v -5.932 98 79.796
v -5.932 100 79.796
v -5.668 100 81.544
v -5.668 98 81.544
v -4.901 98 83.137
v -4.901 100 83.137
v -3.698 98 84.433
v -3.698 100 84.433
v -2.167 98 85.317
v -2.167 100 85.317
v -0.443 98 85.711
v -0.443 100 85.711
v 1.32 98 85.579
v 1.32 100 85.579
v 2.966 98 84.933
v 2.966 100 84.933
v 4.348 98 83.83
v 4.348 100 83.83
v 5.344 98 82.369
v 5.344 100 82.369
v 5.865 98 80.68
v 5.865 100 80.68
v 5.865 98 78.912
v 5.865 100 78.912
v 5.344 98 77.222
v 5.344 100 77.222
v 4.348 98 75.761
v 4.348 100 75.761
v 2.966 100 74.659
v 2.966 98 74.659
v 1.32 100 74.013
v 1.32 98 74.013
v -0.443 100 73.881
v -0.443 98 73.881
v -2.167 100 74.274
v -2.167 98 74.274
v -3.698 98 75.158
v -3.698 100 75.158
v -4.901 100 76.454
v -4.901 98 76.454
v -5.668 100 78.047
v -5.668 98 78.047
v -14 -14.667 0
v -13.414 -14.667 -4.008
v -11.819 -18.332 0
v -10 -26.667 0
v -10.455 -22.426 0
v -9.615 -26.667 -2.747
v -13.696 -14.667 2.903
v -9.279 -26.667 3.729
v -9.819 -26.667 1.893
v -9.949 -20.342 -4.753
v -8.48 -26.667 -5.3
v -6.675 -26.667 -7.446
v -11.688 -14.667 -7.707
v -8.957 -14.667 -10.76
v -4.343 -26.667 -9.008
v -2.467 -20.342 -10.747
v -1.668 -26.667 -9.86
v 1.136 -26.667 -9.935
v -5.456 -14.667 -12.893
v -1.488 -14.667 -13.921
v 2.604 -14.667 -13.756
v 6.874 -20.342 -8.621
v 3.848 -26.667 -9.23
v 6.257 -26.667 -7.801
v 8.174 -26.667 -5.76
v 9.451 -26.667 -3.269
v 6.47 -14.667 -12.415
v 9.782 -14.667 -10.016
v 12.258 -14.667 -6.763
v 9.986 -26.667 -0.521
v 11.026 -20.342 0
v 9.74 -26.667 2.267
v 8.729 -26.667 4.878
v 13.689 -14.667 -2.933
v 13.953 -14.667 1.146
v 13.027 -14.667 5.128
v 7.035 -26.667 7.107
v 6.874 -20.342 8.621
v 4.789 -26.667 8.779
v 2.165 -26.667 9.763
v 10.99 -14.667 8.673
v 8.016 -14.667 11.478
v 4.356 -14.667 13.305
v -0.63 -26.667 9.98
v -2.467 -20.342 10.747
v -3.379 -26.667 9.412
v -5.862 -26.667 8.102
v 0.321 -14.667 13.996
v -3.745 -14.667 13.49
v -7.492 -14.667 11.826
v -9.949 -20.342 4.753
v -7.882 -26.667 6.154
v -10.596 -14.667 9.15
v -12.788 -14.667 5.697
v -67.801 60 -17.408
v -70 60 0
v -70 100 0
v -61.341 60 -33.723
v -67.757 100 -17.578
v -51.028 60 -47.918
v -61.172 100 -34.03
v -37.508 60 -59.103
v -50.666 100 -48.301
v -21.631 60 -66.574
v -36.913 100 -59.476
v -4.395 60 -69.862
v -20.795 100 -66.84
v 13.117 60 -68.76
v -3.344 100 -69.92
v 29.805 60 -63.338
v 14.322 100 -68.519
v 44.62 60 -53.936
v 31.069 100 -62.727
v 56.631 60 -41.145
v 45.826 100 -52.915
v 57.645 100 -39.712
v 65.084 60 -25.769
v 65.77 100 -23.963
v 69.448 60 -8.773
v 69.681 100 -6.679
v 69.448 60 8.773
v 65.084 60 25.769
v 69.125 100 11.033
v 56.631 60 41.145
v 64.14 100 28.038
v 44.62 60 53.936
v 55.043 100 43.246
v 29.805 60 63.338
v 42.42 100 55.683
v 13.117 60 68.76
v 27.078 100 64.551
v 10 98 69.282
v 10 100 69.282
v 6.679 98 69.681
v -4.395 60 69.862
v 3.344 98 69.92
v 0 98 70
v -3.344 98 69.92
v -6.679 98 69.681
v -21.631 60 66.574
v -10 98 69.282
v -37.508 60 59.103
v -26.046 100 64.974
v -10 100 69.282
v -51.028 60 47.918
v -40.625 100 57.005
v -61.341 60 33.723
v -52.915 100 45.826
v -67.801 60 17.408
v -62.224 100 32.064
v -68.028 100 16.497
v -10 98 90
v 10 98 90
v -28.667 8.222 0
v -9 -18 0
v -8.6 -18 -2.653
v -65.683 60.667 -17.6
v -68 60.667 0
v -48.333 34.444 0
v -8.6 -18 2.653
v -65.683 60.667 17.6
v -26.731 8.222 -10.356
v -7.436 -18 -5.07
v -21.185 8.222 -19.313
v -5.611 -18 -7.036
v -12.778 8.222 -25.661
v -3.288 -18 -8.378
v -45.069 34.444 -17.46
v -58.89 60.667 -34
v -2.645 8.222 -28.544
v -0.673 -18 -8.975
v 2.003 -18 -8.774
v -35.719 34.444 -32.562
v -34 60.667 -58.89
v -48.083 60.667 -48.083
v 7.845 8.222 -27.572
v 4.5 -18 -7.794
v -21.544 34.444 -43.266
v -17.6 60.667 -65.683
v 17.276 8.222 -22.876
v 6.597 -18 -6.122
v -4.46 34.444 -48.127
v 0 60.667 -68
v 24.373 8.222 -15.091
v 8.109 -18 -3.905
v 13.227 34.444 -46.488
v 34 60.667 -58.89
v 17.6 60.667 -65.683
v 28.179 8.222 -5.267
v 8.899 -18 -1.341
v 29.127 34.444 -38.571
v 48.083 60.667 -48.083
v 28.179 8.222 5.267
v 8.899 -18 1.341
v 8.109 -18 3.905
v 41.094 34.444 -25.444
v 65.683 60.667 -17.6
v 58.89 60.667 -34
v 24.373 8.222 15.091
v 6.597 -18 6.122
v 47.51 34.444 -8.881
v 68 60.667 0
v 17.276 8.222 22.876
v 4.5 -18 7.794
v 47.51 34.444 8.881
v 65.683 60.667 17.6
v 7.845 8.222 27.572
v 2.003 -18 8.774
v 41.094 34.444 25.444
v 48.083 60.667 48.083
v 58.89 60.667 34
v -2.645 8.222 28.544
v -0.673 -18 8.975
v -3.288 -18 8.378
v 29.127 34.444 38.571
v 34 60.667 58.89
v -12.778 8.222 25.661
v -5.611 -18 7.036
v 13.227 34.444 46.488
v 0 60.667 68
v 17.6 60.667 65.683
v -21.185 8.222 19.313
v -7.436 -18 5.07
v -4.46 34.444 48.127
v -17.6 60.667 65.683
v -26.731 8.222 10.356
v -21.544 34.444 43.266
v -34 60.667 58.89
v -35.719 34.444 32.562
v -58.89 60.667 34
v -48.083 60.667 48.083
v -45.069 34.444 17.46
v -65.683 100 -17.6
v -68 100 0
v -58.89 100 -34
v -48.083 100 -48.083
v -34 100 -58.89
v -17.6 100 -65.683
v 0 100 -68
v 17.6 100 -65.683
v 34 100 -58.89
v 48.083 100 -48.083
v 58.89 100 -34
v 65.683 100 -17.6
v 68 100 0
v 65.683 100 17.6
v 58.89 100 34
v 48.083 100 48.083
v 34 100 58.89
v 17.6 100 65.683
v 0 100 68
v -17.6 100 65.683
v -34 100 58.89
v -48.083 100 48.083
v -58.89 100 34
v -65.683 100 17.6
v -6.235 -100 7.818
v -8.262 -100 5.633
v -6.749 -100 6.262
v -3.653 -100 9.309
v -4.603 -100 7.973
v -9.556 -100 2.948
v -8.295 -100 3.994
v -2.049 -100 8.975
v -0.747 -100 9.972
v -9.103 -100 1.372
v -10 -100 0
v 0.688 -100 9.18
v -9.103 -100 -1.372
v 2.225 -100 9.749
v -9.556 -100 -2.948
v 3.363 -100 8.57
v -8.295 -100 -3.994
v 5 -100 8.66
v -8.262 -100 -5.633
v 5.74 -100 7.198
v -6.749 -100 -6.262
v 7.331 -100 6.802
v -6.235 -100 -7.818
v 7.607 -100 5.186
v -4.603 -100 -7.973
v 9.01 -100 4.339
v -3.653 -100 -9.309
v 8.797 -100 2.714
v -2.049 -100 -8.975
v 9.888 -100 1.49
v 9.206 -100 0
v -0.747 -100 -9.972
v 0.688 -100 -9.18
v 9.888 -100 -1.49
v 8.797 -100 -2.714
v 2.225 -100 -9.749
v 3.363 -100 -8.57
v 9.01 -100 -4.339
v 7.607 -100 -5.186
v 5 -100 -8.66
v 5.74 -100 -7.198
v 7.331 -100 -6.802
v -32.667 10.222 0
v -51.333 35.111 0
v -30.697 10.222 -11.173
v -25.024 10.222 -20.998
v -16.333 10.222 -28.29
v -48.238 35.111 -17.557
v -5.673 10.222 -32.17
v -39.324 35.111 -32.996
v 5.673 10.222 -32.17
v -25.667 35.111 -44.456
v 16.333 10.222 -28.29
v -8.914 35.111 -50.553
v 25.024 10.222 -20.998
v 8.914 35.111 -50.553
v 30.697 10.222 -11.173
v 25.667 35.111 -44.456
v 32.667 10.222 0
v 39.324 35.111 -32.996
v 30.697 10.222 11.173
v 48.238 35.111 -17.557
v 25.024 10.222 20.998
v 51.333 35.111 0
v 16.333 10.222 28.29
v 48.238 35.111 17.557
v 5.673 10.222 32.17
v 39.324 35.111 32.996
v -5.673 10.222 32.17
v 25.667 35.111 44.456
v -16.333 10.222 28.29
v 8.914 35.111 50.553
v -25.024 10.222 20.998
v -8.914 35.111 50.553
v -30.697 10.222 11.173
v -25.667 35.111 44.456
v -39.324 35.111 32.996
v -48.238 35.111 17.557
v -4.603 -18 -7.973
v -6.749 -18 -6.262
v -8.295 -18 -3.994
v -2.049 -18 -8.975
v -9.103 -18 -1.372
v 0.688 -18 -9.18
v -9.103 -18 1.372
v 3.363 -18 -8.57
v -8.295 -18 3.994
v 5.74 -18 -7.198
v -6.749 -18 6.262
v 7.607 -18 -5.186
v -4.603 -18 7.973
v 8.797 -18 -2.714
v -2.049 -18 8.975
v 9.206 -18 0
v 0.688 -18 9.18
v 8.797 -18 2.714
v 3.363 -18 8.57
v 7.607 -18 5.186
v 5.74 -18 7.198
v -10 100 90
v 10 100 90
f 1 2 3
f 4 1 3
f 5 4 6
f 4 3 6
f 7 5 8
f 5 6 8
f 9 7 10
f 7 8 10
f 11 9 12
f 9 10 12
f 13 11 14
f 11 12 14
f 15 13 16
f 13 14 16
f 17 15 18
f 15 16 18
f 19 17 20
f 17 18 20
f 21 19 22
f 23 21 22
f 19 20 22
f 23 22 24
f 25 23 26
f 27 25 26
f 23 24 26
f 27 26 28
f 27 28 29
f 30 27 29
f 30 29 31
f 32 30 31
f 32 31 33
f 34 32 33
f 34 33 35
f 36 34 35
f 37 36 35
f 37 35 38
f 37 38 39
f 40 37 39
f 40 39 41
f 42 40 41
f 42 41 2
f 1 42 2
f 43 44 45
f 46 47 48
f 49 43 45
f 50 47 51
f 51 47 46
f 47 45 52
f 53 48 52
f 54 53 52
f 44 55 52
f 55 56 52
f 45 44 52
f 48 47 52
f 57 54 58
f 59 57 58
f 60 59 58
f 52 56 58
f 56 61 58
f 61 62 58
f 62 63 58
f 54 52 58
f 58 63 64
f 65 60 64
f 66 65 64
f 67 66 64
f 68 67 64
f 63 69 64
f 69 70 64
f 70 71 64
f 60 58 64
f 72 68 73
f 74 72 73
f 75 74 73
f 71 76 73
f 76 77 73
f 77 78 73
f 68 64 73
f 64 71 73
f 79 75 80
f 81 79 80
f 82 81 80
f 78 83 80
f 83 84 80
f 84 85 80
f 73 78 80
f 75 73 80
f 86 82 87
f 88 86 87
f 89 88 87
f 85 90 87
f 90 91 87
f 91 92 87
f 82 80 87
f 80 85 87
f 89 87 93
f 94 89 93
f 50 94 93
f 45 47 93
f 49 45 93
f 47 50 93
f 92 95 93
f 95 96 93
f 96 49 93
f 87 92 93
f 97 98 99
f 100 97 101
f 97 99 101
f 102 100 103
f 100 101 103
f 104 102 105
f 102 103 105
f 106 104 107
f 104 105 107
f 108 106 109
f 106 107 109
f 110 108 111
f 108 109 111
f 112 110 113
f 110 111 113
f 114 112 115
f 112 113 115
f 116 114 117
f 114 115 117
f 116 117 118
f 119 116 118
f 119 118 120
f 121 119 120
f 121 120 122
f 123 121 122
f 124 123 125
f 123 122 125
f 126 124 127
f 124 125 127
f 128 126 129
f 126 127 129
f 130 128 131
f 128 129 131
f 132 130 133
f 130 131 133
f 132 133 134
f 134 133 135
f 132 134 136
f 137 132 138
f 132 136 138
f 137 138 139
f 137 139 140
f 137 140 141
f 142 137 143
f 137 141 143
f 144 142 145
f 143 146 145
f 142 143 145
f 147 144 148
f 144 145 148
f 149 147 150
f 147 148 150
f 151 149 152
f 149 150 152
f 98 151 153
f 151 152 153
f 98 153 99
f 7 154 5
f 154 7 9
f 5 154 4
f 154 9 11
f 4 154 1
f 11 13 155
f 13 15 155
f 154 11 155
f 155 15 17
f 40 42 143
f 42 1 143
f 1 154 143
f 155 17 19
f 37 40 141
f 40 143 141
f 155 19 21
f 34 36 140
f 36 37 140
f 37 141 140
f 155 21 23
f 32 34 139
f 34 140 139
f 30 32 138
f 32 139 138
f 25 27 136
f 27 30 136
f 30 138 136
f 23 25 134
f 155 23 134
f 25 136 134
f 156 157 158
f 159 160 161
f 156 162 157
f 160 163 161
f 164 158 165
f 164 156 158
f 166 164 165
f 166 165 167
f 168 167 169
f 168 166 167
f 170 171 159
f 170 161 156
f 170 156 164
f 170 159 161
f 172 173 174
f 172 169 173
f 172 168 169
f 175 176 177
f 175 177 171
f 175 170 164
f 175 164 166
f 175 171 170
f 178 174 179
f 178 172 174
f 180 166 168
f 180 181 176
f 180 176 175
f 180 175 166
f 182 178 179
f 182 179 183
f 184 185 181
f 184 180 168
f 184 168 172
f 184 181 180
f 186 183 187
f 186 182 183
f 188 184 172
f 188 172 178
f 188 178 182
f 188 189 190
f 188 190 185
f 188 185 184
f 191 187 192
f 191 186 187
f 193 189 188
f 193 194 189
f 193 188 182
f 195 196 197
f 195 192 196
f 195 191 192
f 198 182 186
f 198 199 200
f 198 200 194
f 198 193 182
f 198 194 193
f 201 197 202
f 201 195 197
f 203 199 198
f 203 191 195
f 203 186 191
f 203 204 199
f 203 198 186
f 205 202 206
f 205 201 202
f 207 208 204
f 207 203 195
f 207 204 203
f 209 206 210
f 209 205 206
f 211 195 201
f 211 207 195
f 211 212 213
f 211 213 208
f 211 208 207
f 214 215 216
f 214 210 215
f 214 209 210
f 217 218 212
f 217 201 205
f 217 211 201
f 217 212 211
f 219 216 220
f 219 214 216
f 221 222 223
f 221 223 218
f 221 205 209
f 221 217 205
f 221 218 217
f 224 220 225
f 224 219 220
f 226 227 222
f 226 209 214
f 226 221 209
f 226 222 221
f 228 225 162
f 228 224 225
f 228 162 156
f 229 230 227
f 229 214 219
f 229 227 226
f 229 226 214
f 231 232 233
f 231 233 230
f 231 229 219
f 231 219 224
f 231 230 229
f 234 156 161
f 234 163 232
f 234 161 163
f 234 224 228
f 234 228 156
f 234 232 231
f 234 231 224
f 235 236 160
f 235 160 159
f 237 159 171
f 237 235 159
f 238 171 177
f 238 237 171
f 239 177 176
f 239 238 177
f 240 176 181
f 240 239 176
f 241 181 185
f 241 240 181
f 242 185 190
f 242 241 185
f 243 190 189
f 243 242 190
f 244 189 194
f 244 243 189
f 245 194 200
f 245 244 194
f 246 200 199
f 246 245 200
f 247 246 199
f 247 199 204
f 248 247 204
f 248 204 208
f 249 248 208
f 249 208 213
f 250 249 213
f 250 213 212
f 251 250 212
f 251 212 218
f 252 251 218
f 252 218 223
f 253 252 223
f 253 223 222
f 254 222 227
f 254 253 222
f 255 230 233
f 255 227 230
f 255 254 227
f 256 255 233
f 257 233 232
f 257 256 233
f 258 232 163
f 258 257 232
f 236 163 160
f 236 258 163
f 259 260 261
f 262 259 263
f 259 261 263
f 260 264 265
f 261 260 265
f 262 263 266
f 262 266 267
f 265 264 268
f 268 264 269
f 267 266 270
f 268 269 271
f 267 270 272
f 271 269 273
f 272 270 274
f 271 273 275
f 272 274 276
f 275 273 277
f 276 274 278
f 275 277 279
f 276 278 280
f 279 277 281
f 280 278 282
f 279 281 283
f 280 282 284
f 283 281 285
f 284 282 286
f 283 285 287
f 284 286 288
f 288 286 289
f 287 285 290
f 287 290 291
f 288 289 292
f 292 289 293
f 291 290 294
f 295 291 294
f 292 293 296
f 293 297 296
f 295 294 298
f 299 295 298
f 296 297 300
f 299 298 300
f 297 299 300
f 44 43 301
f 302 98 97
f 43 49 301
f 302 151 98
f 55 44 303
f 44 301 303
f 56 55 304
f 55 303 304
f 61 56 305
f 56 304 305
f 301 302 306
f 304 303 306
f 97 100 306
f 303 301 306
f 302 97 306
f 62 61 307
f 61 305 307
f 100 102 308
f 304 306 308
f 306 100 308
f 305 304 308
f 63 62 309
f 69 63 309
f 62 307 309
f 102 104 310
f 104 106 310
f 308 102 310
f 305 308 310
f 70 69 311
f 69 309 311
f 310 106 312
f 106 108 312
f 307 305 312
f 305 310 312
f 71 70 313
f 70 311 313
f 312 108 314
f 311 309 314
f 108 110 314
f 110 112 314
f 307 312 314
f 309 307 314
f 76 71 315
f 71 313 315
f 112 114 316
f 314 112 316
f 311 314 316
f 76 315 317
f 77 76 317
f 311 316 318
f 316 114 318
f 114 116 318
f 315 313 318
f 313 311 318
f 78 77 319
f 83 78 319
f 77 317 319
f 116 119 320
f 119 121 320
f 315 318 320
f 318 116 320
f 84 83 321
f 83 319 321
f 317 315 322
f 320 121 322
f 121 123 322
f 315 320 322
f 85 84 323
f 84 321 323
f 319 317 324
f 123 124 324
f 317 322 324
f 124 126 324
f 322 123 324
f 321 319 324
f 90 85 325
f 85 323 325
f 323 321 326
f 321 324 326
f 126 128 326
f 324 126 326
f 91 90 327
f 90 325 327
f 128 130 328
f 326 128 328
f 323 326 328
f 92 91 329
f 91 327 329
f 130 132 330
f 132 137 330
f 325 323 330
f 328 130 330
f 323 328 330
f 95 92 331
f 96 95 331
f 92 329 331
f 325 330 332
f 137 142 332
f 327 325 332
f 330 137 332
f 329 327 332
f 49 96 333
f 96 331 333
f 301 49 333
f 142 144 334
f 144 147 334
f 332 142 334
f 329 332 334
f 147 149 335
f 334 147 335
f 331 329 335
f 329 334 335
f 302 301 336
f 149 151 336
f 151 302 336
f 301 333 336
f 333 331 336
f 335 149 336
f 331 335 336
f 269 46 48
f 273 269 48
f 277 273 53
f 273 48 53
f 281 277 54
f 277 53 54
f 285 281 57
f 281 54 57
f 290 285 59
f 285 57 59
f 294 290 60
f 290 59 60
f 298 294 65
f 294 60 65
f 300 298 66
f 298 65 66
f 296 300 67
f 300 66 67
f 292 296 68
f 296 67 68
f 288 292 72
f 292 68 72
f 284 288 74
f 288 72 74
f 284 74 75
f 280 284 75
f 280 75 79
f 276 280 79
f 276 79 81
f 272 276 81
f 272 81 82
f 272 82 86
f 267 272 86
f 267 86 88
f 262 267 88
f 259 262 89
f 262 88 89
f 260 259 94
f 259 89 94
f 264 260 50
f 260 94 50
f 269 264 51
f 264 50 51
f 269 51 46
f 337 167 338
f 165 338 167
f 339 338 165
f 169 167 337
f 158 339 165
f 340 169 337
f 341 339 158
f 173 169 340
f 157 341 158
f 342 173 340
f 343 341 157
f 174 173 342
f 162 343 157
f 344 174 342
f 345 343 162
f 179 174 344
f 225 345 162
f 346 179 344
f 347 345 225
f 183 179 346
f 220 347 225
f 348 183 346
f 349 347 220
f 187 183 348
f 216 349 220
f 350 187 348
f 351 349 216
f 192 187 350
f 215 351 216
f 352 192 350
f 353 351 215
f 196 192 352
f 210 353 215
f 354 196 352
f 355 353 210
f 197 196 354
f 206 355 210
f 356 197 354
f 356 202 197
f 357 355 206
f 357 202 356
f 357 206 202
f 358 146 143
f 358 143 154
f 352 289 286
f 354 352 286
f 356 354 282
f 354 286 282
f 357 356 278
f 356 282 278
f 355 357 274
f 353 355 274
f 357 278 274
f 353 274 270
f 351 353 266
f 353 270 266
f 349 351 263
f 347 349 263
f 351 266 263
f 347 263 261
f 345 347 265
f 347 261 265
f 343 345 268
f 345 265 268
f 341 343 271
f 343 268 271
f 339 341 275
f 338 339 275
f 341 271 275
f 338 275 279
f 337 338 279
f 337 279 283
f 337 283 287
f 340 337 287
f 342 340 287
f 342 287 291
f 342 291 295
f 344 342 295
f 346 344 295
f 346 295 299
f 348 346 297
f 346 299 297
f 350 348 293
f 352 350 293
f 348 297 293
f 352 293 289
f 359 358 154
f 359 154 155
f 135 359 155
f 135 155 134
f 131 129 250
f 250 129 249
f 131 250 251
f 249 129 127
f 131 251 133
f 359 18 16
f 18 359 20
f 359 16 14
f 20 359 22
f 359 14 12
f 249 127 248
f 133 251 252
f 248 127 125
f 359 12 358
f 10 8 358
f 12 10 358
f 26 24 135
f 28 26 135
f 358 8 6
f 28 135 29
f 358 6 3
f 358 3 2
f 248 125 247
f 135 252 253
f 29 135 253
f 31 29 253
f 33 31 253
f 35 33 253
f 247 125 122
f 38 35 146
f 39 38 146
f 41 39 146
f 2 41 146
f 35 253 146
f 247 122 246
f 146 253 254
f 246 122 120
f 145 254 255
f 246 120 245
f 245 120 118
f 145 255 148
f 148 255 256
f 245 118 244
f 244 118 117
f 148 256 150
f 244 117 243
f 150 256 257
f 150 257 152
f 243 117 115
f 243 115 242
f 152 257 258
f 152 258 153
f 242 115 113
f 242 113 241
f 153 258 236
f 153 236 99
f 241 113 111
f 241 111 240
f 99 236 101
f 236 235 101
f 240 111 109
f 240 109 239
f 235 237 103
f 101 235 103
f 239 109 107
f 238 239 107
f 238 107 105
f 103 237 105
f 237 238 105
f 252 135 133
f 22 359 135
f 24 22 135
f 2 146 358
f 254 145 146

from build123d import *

# Parameters (mm, degrees)
VACIADO1_T              = -2
SALIENTE_EXTRUIR1_DEPTH = 2
CROQUIS3_R              = 5.931653108
CORTAR_EXTRUIR1_DEPTH   = 22
CROQUIS4_R              = 9.206232533
CORTAR_EXTRUIR2_DEPTH   = 82
REDONDEO1_R             = 20


with BuildPart() as part:
    # Croquis1 → Revolución1 (revolve)
    with BuildSketch(Plane.XY, mode=Mode.PRIVATE) as revoluci_n1_sk:
        Polygon((10, -20), (70, 60), (70, 100), (0, 100), (0, -100), (10, -100), align=None)
    revolve(revoluci_n1_sk.sketch.rotate(Axis((0, 100, 0), (0, -1, 0)), 180), axis=Axis((0, 100, 0), (0, -1, 0)))

    # Vaciado1
    vaciado1_openings = [part.faces().sort_by_distance(p)[0] for p in [
        (0, -100, 0),
        (0, 100, 0),
    ]]
    offset(amount=VACIADO1_T, openings=vaciado1_openings, kind=Kind.INTERSECTION)

    # Croquis2 → Saliente-Extruir1 (add)
    with BuildSketch(Plane(origin=(0, 100, 0), x_dir=(1, 0, 0), z_dir=(0, 1, 0))):
        with BuildLine():
            ThreePointArc((10, -69.282032303), (5.012870376, -69.82027736), (0, -70))
            Line((0, -70), (0, -90))
            Line((0, -90), (10, -90))
            Line((10, -90), (10, -69.282032303))
        make_face()
        with BuildLine():
            Line((0, -90), (0, -70))
            ThreePointArc((0, -70), (-5.012870376, -69.82027736), (-10, -69.282032303))
            Line((-10, -69.282032303), (-10, -90))
            Line((-10, -90), (0, -90))
        make_face()
    extrude(amount=-SALIENTE_EXTRUIR1_DEPTH)

    # Croquis3 → Cortar-Extruir1 (cut)
    with BuildSketch(Plane(origin=(0, 100, 0), x_dir=(1, 0, 0), z_dir=(0, 1, 0))):
        with Locations(Location((0, -79.795784901, 0), (0, 0, 180))):
            Circle(CROQUIS3_R)
    extrude(amount=-CORTAR_EXTRUIR1_DEPTH, mode=Mode.SUBTRACT)

    # Croquis4 → Cortar-Extruir2 (cut)
    with BuildSketch(Plane(origin=(0, -100, 0), x_dir=(-1, 0, 0), z_dir=(0, -1, 0))):
        with Locations(Location((0, 0, 0), (0, 0, 180))):
            Circle(CROQUIS4_R)
    extrude(amount=-CORTAR_EXTRUIR2_DEPTH, mode=Mode.SUBTRACT)

    # Redondeo1
    redondeo1_edges = [part.edges().sort_by_distance(p)[0] for p in [
        (10, -20, 0),
    ]]
    fillet(redondeo1_edges, radius=REDONDEO1_R)


solid = part.part
